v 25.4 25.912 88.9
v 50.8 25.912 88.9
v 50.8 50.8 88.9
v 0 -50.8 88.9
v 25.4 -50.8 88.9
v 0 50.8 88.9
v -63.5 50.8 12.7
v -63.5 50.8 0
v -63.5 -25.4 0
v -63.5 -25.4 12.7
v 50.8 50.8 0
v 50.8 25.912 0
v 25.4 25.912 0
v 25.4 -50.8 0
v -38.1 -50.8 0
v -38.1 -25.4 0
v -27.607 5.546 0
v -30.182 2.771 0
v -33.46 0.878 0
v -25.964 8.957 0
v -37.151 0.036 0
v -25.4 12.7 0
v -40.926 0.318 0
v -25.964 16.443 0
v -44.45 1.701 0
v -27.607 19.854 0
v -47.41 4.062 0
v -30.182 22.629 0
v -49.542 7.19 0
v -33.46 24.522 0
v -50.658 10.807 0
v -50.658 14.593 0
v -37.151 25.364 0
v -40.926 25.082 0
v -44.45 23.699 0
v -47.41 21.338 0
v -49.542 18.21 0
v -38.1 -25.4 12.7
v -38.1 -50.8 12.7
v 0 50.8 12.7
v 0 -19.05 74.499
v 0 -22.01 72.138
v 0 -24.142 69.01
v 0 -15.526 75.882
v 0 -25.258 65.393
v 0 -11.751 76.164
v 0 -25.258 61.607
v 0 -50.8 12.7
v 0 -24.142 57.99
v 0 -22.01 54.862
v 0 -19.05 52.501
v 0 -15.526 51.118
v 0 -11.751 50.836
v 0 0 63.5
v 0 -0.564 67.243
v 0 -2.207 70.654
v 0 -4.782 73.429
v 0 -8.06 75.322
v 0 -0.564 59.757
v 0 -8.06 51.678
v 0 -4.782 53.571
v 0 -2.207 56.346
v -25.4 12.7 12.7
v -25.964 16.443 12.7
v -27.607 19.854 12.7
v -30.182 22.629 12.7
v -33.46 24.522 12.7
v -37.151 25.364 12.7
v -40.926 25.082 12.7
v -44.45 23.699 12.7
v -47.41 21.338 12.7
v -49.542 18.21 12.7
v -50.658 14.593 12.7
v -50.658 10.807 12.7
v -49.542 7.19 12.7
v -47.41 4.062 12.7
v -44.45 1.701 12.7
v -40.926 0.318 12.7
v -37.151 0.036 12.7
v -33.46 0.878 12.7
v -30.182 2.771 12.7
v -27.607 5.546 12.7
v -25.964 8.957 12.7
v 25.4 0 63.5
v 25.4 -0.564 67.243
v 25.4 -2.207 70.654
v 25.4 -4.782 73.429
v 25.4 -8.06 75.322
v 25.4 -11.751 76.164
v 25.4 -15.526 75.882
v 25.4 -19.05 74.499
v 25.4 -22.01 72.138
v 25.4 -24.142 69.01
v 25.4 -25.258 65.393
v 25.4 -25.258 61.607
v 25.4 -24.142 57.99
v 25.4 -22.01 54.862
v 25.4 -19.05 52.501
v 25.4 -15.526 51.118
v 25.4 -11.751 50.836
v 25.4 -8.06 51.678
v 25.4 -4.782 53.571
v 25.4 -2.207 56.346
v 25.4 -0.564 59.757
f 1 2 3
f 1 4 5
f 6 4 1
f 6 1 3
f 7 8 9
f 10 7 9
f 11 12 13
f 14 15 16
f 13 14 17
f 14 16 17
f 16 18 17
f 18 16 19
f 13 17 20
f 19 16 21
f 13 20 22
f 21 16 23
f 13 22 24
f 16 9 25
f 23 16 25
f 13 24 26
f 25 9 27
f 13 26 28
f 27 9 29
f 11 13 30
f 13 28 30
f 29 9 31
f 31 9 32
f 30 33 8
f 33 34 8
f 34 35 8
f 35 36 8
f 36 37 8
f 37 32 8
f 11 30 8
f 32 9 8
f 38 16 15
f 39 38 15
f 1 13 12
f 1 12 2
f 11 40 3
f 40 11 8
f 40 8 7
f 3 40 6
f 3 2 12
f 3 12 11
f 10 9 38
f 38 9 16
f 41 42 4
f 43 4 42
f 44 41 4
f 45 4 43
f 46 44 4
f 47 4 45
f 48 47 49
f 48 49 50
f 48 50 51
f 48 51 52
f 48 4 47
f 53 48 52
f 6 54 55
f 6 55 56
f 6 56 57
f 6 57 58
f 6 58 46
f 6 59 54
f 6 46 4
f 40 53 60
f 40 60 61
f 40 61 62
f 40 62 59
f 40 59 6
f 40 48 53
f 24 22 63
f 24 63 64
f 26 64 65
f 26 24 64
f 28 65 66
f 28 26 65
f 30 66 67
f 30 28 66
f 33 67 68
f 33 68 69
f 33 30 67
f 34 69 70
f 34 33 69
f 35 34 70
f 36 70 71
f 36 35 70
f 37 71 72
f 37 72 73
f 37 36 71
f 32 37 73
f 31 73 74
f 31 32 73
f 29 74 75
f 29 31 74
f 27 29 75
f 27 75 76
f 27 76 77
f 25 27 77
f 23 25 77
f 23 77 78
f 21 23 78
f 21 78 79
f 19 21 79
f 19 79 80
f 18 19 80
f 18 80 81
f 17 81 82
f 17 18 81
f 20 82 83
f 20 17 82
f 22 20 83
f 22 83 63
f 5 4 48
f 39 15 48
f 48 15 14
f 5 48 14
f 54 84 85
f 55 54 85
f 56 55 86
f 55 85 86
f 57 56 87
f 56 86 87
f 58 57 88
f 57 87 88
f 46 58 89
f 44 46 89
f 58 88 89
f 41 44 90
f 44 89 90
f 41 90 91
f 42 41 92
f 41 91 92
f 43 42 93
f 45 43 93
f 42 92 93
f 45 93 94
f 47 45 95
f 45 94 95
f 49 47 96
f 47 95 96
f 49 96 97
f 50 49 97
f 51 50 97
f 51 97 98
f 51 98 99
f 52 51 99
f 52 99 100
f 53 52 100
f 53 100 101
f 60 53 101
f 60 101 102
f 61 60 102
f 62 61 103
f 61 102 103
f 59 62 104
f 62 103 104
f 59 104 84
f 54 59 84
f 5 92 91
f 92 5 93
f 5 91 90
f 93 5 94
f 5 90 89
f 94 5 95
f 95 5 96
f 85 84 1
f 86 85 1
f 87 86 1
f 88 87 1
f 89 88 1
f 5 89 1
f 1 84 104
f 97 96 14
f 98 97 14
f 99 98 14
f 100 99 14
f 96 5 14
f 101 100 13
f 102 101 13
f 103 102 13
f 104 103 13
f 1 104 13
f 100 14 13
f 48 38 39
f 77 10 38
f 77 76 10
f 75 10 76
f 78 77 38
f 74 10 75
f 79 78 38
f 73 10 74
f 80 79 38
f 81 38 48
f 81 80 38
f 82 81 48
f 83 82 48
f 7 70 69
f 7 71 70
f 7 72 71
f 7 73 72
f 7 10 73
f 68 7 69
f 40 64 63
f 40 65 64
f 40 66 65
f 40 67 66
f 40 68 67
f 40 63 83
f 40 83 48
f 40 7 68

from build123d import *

# Parameters (mm, degrees)
F0_R     = 12.7
F1_DEPTH = 12.7
F2_W     = 12.7
F2_H     = 101.6
F3_DEPTH = 25.4
F2_W_2   = 25.4
F4_DEPTH = 76.2
F5_R     = 12.7
F6_DEPTH = 25.4
F7_W     = 24.888192
F7_H     = 88.9
F8_DEPTH = 25.4


with BuildPart() as f1:
    # F0 (on Top) → F1 (new body)
    with BuildSketch(Plane.XY):
        Polygon((-38.1, -50.8), (38.1, -50.8), (38.1, 50.8), (-38.1, 50.8), (-63.5, 50.8), (-63.5, -25.4), (-38.1, -25.4), align=None)
        with Locations((-38.1, 12.7)):
            Circle(F0_R, mode=Mode.SUBTRACT)
    extrude(amount=F1_DEPTH)

    # F2 (on face) → F3 (cut)
    with BuildSketch(Plane.XY.offset(12.7)):
        with Locations((31.75, 0)):
            Rectangle(F2_W, F2_H)
    extrude(amount=-F3_DEPTH, mode=Mode.SUBTRACT)

    # F2 (on face) → F4 (join)
    with BuildSketch(Plane.XY.offset(12.7)):
        with Locations((12.7, 0)):
            Rectangle(F2_W_2, F2_H)
    extrude(amount=F4_DEPTH)

    # F5 (on face) → F6 (cut)
    with BuildSketch(Plane.YZ.offset(25.4)):
        with Locations((-12.7, 63.5)):
            Circle(F5_R)
    extrude(amount=-F6_DEPTH, mode=Mode.SUBTRACT)

    # F7 (on face) → F8 (join)
    with BuildSketch(Plane.YZ.offset(25.4)):
        with Locations((38.355904, 44.45)):
            Rectangle(F7_W, F7_H)
    extrude(amount=F8_DEPTH)


solid = f1.part
